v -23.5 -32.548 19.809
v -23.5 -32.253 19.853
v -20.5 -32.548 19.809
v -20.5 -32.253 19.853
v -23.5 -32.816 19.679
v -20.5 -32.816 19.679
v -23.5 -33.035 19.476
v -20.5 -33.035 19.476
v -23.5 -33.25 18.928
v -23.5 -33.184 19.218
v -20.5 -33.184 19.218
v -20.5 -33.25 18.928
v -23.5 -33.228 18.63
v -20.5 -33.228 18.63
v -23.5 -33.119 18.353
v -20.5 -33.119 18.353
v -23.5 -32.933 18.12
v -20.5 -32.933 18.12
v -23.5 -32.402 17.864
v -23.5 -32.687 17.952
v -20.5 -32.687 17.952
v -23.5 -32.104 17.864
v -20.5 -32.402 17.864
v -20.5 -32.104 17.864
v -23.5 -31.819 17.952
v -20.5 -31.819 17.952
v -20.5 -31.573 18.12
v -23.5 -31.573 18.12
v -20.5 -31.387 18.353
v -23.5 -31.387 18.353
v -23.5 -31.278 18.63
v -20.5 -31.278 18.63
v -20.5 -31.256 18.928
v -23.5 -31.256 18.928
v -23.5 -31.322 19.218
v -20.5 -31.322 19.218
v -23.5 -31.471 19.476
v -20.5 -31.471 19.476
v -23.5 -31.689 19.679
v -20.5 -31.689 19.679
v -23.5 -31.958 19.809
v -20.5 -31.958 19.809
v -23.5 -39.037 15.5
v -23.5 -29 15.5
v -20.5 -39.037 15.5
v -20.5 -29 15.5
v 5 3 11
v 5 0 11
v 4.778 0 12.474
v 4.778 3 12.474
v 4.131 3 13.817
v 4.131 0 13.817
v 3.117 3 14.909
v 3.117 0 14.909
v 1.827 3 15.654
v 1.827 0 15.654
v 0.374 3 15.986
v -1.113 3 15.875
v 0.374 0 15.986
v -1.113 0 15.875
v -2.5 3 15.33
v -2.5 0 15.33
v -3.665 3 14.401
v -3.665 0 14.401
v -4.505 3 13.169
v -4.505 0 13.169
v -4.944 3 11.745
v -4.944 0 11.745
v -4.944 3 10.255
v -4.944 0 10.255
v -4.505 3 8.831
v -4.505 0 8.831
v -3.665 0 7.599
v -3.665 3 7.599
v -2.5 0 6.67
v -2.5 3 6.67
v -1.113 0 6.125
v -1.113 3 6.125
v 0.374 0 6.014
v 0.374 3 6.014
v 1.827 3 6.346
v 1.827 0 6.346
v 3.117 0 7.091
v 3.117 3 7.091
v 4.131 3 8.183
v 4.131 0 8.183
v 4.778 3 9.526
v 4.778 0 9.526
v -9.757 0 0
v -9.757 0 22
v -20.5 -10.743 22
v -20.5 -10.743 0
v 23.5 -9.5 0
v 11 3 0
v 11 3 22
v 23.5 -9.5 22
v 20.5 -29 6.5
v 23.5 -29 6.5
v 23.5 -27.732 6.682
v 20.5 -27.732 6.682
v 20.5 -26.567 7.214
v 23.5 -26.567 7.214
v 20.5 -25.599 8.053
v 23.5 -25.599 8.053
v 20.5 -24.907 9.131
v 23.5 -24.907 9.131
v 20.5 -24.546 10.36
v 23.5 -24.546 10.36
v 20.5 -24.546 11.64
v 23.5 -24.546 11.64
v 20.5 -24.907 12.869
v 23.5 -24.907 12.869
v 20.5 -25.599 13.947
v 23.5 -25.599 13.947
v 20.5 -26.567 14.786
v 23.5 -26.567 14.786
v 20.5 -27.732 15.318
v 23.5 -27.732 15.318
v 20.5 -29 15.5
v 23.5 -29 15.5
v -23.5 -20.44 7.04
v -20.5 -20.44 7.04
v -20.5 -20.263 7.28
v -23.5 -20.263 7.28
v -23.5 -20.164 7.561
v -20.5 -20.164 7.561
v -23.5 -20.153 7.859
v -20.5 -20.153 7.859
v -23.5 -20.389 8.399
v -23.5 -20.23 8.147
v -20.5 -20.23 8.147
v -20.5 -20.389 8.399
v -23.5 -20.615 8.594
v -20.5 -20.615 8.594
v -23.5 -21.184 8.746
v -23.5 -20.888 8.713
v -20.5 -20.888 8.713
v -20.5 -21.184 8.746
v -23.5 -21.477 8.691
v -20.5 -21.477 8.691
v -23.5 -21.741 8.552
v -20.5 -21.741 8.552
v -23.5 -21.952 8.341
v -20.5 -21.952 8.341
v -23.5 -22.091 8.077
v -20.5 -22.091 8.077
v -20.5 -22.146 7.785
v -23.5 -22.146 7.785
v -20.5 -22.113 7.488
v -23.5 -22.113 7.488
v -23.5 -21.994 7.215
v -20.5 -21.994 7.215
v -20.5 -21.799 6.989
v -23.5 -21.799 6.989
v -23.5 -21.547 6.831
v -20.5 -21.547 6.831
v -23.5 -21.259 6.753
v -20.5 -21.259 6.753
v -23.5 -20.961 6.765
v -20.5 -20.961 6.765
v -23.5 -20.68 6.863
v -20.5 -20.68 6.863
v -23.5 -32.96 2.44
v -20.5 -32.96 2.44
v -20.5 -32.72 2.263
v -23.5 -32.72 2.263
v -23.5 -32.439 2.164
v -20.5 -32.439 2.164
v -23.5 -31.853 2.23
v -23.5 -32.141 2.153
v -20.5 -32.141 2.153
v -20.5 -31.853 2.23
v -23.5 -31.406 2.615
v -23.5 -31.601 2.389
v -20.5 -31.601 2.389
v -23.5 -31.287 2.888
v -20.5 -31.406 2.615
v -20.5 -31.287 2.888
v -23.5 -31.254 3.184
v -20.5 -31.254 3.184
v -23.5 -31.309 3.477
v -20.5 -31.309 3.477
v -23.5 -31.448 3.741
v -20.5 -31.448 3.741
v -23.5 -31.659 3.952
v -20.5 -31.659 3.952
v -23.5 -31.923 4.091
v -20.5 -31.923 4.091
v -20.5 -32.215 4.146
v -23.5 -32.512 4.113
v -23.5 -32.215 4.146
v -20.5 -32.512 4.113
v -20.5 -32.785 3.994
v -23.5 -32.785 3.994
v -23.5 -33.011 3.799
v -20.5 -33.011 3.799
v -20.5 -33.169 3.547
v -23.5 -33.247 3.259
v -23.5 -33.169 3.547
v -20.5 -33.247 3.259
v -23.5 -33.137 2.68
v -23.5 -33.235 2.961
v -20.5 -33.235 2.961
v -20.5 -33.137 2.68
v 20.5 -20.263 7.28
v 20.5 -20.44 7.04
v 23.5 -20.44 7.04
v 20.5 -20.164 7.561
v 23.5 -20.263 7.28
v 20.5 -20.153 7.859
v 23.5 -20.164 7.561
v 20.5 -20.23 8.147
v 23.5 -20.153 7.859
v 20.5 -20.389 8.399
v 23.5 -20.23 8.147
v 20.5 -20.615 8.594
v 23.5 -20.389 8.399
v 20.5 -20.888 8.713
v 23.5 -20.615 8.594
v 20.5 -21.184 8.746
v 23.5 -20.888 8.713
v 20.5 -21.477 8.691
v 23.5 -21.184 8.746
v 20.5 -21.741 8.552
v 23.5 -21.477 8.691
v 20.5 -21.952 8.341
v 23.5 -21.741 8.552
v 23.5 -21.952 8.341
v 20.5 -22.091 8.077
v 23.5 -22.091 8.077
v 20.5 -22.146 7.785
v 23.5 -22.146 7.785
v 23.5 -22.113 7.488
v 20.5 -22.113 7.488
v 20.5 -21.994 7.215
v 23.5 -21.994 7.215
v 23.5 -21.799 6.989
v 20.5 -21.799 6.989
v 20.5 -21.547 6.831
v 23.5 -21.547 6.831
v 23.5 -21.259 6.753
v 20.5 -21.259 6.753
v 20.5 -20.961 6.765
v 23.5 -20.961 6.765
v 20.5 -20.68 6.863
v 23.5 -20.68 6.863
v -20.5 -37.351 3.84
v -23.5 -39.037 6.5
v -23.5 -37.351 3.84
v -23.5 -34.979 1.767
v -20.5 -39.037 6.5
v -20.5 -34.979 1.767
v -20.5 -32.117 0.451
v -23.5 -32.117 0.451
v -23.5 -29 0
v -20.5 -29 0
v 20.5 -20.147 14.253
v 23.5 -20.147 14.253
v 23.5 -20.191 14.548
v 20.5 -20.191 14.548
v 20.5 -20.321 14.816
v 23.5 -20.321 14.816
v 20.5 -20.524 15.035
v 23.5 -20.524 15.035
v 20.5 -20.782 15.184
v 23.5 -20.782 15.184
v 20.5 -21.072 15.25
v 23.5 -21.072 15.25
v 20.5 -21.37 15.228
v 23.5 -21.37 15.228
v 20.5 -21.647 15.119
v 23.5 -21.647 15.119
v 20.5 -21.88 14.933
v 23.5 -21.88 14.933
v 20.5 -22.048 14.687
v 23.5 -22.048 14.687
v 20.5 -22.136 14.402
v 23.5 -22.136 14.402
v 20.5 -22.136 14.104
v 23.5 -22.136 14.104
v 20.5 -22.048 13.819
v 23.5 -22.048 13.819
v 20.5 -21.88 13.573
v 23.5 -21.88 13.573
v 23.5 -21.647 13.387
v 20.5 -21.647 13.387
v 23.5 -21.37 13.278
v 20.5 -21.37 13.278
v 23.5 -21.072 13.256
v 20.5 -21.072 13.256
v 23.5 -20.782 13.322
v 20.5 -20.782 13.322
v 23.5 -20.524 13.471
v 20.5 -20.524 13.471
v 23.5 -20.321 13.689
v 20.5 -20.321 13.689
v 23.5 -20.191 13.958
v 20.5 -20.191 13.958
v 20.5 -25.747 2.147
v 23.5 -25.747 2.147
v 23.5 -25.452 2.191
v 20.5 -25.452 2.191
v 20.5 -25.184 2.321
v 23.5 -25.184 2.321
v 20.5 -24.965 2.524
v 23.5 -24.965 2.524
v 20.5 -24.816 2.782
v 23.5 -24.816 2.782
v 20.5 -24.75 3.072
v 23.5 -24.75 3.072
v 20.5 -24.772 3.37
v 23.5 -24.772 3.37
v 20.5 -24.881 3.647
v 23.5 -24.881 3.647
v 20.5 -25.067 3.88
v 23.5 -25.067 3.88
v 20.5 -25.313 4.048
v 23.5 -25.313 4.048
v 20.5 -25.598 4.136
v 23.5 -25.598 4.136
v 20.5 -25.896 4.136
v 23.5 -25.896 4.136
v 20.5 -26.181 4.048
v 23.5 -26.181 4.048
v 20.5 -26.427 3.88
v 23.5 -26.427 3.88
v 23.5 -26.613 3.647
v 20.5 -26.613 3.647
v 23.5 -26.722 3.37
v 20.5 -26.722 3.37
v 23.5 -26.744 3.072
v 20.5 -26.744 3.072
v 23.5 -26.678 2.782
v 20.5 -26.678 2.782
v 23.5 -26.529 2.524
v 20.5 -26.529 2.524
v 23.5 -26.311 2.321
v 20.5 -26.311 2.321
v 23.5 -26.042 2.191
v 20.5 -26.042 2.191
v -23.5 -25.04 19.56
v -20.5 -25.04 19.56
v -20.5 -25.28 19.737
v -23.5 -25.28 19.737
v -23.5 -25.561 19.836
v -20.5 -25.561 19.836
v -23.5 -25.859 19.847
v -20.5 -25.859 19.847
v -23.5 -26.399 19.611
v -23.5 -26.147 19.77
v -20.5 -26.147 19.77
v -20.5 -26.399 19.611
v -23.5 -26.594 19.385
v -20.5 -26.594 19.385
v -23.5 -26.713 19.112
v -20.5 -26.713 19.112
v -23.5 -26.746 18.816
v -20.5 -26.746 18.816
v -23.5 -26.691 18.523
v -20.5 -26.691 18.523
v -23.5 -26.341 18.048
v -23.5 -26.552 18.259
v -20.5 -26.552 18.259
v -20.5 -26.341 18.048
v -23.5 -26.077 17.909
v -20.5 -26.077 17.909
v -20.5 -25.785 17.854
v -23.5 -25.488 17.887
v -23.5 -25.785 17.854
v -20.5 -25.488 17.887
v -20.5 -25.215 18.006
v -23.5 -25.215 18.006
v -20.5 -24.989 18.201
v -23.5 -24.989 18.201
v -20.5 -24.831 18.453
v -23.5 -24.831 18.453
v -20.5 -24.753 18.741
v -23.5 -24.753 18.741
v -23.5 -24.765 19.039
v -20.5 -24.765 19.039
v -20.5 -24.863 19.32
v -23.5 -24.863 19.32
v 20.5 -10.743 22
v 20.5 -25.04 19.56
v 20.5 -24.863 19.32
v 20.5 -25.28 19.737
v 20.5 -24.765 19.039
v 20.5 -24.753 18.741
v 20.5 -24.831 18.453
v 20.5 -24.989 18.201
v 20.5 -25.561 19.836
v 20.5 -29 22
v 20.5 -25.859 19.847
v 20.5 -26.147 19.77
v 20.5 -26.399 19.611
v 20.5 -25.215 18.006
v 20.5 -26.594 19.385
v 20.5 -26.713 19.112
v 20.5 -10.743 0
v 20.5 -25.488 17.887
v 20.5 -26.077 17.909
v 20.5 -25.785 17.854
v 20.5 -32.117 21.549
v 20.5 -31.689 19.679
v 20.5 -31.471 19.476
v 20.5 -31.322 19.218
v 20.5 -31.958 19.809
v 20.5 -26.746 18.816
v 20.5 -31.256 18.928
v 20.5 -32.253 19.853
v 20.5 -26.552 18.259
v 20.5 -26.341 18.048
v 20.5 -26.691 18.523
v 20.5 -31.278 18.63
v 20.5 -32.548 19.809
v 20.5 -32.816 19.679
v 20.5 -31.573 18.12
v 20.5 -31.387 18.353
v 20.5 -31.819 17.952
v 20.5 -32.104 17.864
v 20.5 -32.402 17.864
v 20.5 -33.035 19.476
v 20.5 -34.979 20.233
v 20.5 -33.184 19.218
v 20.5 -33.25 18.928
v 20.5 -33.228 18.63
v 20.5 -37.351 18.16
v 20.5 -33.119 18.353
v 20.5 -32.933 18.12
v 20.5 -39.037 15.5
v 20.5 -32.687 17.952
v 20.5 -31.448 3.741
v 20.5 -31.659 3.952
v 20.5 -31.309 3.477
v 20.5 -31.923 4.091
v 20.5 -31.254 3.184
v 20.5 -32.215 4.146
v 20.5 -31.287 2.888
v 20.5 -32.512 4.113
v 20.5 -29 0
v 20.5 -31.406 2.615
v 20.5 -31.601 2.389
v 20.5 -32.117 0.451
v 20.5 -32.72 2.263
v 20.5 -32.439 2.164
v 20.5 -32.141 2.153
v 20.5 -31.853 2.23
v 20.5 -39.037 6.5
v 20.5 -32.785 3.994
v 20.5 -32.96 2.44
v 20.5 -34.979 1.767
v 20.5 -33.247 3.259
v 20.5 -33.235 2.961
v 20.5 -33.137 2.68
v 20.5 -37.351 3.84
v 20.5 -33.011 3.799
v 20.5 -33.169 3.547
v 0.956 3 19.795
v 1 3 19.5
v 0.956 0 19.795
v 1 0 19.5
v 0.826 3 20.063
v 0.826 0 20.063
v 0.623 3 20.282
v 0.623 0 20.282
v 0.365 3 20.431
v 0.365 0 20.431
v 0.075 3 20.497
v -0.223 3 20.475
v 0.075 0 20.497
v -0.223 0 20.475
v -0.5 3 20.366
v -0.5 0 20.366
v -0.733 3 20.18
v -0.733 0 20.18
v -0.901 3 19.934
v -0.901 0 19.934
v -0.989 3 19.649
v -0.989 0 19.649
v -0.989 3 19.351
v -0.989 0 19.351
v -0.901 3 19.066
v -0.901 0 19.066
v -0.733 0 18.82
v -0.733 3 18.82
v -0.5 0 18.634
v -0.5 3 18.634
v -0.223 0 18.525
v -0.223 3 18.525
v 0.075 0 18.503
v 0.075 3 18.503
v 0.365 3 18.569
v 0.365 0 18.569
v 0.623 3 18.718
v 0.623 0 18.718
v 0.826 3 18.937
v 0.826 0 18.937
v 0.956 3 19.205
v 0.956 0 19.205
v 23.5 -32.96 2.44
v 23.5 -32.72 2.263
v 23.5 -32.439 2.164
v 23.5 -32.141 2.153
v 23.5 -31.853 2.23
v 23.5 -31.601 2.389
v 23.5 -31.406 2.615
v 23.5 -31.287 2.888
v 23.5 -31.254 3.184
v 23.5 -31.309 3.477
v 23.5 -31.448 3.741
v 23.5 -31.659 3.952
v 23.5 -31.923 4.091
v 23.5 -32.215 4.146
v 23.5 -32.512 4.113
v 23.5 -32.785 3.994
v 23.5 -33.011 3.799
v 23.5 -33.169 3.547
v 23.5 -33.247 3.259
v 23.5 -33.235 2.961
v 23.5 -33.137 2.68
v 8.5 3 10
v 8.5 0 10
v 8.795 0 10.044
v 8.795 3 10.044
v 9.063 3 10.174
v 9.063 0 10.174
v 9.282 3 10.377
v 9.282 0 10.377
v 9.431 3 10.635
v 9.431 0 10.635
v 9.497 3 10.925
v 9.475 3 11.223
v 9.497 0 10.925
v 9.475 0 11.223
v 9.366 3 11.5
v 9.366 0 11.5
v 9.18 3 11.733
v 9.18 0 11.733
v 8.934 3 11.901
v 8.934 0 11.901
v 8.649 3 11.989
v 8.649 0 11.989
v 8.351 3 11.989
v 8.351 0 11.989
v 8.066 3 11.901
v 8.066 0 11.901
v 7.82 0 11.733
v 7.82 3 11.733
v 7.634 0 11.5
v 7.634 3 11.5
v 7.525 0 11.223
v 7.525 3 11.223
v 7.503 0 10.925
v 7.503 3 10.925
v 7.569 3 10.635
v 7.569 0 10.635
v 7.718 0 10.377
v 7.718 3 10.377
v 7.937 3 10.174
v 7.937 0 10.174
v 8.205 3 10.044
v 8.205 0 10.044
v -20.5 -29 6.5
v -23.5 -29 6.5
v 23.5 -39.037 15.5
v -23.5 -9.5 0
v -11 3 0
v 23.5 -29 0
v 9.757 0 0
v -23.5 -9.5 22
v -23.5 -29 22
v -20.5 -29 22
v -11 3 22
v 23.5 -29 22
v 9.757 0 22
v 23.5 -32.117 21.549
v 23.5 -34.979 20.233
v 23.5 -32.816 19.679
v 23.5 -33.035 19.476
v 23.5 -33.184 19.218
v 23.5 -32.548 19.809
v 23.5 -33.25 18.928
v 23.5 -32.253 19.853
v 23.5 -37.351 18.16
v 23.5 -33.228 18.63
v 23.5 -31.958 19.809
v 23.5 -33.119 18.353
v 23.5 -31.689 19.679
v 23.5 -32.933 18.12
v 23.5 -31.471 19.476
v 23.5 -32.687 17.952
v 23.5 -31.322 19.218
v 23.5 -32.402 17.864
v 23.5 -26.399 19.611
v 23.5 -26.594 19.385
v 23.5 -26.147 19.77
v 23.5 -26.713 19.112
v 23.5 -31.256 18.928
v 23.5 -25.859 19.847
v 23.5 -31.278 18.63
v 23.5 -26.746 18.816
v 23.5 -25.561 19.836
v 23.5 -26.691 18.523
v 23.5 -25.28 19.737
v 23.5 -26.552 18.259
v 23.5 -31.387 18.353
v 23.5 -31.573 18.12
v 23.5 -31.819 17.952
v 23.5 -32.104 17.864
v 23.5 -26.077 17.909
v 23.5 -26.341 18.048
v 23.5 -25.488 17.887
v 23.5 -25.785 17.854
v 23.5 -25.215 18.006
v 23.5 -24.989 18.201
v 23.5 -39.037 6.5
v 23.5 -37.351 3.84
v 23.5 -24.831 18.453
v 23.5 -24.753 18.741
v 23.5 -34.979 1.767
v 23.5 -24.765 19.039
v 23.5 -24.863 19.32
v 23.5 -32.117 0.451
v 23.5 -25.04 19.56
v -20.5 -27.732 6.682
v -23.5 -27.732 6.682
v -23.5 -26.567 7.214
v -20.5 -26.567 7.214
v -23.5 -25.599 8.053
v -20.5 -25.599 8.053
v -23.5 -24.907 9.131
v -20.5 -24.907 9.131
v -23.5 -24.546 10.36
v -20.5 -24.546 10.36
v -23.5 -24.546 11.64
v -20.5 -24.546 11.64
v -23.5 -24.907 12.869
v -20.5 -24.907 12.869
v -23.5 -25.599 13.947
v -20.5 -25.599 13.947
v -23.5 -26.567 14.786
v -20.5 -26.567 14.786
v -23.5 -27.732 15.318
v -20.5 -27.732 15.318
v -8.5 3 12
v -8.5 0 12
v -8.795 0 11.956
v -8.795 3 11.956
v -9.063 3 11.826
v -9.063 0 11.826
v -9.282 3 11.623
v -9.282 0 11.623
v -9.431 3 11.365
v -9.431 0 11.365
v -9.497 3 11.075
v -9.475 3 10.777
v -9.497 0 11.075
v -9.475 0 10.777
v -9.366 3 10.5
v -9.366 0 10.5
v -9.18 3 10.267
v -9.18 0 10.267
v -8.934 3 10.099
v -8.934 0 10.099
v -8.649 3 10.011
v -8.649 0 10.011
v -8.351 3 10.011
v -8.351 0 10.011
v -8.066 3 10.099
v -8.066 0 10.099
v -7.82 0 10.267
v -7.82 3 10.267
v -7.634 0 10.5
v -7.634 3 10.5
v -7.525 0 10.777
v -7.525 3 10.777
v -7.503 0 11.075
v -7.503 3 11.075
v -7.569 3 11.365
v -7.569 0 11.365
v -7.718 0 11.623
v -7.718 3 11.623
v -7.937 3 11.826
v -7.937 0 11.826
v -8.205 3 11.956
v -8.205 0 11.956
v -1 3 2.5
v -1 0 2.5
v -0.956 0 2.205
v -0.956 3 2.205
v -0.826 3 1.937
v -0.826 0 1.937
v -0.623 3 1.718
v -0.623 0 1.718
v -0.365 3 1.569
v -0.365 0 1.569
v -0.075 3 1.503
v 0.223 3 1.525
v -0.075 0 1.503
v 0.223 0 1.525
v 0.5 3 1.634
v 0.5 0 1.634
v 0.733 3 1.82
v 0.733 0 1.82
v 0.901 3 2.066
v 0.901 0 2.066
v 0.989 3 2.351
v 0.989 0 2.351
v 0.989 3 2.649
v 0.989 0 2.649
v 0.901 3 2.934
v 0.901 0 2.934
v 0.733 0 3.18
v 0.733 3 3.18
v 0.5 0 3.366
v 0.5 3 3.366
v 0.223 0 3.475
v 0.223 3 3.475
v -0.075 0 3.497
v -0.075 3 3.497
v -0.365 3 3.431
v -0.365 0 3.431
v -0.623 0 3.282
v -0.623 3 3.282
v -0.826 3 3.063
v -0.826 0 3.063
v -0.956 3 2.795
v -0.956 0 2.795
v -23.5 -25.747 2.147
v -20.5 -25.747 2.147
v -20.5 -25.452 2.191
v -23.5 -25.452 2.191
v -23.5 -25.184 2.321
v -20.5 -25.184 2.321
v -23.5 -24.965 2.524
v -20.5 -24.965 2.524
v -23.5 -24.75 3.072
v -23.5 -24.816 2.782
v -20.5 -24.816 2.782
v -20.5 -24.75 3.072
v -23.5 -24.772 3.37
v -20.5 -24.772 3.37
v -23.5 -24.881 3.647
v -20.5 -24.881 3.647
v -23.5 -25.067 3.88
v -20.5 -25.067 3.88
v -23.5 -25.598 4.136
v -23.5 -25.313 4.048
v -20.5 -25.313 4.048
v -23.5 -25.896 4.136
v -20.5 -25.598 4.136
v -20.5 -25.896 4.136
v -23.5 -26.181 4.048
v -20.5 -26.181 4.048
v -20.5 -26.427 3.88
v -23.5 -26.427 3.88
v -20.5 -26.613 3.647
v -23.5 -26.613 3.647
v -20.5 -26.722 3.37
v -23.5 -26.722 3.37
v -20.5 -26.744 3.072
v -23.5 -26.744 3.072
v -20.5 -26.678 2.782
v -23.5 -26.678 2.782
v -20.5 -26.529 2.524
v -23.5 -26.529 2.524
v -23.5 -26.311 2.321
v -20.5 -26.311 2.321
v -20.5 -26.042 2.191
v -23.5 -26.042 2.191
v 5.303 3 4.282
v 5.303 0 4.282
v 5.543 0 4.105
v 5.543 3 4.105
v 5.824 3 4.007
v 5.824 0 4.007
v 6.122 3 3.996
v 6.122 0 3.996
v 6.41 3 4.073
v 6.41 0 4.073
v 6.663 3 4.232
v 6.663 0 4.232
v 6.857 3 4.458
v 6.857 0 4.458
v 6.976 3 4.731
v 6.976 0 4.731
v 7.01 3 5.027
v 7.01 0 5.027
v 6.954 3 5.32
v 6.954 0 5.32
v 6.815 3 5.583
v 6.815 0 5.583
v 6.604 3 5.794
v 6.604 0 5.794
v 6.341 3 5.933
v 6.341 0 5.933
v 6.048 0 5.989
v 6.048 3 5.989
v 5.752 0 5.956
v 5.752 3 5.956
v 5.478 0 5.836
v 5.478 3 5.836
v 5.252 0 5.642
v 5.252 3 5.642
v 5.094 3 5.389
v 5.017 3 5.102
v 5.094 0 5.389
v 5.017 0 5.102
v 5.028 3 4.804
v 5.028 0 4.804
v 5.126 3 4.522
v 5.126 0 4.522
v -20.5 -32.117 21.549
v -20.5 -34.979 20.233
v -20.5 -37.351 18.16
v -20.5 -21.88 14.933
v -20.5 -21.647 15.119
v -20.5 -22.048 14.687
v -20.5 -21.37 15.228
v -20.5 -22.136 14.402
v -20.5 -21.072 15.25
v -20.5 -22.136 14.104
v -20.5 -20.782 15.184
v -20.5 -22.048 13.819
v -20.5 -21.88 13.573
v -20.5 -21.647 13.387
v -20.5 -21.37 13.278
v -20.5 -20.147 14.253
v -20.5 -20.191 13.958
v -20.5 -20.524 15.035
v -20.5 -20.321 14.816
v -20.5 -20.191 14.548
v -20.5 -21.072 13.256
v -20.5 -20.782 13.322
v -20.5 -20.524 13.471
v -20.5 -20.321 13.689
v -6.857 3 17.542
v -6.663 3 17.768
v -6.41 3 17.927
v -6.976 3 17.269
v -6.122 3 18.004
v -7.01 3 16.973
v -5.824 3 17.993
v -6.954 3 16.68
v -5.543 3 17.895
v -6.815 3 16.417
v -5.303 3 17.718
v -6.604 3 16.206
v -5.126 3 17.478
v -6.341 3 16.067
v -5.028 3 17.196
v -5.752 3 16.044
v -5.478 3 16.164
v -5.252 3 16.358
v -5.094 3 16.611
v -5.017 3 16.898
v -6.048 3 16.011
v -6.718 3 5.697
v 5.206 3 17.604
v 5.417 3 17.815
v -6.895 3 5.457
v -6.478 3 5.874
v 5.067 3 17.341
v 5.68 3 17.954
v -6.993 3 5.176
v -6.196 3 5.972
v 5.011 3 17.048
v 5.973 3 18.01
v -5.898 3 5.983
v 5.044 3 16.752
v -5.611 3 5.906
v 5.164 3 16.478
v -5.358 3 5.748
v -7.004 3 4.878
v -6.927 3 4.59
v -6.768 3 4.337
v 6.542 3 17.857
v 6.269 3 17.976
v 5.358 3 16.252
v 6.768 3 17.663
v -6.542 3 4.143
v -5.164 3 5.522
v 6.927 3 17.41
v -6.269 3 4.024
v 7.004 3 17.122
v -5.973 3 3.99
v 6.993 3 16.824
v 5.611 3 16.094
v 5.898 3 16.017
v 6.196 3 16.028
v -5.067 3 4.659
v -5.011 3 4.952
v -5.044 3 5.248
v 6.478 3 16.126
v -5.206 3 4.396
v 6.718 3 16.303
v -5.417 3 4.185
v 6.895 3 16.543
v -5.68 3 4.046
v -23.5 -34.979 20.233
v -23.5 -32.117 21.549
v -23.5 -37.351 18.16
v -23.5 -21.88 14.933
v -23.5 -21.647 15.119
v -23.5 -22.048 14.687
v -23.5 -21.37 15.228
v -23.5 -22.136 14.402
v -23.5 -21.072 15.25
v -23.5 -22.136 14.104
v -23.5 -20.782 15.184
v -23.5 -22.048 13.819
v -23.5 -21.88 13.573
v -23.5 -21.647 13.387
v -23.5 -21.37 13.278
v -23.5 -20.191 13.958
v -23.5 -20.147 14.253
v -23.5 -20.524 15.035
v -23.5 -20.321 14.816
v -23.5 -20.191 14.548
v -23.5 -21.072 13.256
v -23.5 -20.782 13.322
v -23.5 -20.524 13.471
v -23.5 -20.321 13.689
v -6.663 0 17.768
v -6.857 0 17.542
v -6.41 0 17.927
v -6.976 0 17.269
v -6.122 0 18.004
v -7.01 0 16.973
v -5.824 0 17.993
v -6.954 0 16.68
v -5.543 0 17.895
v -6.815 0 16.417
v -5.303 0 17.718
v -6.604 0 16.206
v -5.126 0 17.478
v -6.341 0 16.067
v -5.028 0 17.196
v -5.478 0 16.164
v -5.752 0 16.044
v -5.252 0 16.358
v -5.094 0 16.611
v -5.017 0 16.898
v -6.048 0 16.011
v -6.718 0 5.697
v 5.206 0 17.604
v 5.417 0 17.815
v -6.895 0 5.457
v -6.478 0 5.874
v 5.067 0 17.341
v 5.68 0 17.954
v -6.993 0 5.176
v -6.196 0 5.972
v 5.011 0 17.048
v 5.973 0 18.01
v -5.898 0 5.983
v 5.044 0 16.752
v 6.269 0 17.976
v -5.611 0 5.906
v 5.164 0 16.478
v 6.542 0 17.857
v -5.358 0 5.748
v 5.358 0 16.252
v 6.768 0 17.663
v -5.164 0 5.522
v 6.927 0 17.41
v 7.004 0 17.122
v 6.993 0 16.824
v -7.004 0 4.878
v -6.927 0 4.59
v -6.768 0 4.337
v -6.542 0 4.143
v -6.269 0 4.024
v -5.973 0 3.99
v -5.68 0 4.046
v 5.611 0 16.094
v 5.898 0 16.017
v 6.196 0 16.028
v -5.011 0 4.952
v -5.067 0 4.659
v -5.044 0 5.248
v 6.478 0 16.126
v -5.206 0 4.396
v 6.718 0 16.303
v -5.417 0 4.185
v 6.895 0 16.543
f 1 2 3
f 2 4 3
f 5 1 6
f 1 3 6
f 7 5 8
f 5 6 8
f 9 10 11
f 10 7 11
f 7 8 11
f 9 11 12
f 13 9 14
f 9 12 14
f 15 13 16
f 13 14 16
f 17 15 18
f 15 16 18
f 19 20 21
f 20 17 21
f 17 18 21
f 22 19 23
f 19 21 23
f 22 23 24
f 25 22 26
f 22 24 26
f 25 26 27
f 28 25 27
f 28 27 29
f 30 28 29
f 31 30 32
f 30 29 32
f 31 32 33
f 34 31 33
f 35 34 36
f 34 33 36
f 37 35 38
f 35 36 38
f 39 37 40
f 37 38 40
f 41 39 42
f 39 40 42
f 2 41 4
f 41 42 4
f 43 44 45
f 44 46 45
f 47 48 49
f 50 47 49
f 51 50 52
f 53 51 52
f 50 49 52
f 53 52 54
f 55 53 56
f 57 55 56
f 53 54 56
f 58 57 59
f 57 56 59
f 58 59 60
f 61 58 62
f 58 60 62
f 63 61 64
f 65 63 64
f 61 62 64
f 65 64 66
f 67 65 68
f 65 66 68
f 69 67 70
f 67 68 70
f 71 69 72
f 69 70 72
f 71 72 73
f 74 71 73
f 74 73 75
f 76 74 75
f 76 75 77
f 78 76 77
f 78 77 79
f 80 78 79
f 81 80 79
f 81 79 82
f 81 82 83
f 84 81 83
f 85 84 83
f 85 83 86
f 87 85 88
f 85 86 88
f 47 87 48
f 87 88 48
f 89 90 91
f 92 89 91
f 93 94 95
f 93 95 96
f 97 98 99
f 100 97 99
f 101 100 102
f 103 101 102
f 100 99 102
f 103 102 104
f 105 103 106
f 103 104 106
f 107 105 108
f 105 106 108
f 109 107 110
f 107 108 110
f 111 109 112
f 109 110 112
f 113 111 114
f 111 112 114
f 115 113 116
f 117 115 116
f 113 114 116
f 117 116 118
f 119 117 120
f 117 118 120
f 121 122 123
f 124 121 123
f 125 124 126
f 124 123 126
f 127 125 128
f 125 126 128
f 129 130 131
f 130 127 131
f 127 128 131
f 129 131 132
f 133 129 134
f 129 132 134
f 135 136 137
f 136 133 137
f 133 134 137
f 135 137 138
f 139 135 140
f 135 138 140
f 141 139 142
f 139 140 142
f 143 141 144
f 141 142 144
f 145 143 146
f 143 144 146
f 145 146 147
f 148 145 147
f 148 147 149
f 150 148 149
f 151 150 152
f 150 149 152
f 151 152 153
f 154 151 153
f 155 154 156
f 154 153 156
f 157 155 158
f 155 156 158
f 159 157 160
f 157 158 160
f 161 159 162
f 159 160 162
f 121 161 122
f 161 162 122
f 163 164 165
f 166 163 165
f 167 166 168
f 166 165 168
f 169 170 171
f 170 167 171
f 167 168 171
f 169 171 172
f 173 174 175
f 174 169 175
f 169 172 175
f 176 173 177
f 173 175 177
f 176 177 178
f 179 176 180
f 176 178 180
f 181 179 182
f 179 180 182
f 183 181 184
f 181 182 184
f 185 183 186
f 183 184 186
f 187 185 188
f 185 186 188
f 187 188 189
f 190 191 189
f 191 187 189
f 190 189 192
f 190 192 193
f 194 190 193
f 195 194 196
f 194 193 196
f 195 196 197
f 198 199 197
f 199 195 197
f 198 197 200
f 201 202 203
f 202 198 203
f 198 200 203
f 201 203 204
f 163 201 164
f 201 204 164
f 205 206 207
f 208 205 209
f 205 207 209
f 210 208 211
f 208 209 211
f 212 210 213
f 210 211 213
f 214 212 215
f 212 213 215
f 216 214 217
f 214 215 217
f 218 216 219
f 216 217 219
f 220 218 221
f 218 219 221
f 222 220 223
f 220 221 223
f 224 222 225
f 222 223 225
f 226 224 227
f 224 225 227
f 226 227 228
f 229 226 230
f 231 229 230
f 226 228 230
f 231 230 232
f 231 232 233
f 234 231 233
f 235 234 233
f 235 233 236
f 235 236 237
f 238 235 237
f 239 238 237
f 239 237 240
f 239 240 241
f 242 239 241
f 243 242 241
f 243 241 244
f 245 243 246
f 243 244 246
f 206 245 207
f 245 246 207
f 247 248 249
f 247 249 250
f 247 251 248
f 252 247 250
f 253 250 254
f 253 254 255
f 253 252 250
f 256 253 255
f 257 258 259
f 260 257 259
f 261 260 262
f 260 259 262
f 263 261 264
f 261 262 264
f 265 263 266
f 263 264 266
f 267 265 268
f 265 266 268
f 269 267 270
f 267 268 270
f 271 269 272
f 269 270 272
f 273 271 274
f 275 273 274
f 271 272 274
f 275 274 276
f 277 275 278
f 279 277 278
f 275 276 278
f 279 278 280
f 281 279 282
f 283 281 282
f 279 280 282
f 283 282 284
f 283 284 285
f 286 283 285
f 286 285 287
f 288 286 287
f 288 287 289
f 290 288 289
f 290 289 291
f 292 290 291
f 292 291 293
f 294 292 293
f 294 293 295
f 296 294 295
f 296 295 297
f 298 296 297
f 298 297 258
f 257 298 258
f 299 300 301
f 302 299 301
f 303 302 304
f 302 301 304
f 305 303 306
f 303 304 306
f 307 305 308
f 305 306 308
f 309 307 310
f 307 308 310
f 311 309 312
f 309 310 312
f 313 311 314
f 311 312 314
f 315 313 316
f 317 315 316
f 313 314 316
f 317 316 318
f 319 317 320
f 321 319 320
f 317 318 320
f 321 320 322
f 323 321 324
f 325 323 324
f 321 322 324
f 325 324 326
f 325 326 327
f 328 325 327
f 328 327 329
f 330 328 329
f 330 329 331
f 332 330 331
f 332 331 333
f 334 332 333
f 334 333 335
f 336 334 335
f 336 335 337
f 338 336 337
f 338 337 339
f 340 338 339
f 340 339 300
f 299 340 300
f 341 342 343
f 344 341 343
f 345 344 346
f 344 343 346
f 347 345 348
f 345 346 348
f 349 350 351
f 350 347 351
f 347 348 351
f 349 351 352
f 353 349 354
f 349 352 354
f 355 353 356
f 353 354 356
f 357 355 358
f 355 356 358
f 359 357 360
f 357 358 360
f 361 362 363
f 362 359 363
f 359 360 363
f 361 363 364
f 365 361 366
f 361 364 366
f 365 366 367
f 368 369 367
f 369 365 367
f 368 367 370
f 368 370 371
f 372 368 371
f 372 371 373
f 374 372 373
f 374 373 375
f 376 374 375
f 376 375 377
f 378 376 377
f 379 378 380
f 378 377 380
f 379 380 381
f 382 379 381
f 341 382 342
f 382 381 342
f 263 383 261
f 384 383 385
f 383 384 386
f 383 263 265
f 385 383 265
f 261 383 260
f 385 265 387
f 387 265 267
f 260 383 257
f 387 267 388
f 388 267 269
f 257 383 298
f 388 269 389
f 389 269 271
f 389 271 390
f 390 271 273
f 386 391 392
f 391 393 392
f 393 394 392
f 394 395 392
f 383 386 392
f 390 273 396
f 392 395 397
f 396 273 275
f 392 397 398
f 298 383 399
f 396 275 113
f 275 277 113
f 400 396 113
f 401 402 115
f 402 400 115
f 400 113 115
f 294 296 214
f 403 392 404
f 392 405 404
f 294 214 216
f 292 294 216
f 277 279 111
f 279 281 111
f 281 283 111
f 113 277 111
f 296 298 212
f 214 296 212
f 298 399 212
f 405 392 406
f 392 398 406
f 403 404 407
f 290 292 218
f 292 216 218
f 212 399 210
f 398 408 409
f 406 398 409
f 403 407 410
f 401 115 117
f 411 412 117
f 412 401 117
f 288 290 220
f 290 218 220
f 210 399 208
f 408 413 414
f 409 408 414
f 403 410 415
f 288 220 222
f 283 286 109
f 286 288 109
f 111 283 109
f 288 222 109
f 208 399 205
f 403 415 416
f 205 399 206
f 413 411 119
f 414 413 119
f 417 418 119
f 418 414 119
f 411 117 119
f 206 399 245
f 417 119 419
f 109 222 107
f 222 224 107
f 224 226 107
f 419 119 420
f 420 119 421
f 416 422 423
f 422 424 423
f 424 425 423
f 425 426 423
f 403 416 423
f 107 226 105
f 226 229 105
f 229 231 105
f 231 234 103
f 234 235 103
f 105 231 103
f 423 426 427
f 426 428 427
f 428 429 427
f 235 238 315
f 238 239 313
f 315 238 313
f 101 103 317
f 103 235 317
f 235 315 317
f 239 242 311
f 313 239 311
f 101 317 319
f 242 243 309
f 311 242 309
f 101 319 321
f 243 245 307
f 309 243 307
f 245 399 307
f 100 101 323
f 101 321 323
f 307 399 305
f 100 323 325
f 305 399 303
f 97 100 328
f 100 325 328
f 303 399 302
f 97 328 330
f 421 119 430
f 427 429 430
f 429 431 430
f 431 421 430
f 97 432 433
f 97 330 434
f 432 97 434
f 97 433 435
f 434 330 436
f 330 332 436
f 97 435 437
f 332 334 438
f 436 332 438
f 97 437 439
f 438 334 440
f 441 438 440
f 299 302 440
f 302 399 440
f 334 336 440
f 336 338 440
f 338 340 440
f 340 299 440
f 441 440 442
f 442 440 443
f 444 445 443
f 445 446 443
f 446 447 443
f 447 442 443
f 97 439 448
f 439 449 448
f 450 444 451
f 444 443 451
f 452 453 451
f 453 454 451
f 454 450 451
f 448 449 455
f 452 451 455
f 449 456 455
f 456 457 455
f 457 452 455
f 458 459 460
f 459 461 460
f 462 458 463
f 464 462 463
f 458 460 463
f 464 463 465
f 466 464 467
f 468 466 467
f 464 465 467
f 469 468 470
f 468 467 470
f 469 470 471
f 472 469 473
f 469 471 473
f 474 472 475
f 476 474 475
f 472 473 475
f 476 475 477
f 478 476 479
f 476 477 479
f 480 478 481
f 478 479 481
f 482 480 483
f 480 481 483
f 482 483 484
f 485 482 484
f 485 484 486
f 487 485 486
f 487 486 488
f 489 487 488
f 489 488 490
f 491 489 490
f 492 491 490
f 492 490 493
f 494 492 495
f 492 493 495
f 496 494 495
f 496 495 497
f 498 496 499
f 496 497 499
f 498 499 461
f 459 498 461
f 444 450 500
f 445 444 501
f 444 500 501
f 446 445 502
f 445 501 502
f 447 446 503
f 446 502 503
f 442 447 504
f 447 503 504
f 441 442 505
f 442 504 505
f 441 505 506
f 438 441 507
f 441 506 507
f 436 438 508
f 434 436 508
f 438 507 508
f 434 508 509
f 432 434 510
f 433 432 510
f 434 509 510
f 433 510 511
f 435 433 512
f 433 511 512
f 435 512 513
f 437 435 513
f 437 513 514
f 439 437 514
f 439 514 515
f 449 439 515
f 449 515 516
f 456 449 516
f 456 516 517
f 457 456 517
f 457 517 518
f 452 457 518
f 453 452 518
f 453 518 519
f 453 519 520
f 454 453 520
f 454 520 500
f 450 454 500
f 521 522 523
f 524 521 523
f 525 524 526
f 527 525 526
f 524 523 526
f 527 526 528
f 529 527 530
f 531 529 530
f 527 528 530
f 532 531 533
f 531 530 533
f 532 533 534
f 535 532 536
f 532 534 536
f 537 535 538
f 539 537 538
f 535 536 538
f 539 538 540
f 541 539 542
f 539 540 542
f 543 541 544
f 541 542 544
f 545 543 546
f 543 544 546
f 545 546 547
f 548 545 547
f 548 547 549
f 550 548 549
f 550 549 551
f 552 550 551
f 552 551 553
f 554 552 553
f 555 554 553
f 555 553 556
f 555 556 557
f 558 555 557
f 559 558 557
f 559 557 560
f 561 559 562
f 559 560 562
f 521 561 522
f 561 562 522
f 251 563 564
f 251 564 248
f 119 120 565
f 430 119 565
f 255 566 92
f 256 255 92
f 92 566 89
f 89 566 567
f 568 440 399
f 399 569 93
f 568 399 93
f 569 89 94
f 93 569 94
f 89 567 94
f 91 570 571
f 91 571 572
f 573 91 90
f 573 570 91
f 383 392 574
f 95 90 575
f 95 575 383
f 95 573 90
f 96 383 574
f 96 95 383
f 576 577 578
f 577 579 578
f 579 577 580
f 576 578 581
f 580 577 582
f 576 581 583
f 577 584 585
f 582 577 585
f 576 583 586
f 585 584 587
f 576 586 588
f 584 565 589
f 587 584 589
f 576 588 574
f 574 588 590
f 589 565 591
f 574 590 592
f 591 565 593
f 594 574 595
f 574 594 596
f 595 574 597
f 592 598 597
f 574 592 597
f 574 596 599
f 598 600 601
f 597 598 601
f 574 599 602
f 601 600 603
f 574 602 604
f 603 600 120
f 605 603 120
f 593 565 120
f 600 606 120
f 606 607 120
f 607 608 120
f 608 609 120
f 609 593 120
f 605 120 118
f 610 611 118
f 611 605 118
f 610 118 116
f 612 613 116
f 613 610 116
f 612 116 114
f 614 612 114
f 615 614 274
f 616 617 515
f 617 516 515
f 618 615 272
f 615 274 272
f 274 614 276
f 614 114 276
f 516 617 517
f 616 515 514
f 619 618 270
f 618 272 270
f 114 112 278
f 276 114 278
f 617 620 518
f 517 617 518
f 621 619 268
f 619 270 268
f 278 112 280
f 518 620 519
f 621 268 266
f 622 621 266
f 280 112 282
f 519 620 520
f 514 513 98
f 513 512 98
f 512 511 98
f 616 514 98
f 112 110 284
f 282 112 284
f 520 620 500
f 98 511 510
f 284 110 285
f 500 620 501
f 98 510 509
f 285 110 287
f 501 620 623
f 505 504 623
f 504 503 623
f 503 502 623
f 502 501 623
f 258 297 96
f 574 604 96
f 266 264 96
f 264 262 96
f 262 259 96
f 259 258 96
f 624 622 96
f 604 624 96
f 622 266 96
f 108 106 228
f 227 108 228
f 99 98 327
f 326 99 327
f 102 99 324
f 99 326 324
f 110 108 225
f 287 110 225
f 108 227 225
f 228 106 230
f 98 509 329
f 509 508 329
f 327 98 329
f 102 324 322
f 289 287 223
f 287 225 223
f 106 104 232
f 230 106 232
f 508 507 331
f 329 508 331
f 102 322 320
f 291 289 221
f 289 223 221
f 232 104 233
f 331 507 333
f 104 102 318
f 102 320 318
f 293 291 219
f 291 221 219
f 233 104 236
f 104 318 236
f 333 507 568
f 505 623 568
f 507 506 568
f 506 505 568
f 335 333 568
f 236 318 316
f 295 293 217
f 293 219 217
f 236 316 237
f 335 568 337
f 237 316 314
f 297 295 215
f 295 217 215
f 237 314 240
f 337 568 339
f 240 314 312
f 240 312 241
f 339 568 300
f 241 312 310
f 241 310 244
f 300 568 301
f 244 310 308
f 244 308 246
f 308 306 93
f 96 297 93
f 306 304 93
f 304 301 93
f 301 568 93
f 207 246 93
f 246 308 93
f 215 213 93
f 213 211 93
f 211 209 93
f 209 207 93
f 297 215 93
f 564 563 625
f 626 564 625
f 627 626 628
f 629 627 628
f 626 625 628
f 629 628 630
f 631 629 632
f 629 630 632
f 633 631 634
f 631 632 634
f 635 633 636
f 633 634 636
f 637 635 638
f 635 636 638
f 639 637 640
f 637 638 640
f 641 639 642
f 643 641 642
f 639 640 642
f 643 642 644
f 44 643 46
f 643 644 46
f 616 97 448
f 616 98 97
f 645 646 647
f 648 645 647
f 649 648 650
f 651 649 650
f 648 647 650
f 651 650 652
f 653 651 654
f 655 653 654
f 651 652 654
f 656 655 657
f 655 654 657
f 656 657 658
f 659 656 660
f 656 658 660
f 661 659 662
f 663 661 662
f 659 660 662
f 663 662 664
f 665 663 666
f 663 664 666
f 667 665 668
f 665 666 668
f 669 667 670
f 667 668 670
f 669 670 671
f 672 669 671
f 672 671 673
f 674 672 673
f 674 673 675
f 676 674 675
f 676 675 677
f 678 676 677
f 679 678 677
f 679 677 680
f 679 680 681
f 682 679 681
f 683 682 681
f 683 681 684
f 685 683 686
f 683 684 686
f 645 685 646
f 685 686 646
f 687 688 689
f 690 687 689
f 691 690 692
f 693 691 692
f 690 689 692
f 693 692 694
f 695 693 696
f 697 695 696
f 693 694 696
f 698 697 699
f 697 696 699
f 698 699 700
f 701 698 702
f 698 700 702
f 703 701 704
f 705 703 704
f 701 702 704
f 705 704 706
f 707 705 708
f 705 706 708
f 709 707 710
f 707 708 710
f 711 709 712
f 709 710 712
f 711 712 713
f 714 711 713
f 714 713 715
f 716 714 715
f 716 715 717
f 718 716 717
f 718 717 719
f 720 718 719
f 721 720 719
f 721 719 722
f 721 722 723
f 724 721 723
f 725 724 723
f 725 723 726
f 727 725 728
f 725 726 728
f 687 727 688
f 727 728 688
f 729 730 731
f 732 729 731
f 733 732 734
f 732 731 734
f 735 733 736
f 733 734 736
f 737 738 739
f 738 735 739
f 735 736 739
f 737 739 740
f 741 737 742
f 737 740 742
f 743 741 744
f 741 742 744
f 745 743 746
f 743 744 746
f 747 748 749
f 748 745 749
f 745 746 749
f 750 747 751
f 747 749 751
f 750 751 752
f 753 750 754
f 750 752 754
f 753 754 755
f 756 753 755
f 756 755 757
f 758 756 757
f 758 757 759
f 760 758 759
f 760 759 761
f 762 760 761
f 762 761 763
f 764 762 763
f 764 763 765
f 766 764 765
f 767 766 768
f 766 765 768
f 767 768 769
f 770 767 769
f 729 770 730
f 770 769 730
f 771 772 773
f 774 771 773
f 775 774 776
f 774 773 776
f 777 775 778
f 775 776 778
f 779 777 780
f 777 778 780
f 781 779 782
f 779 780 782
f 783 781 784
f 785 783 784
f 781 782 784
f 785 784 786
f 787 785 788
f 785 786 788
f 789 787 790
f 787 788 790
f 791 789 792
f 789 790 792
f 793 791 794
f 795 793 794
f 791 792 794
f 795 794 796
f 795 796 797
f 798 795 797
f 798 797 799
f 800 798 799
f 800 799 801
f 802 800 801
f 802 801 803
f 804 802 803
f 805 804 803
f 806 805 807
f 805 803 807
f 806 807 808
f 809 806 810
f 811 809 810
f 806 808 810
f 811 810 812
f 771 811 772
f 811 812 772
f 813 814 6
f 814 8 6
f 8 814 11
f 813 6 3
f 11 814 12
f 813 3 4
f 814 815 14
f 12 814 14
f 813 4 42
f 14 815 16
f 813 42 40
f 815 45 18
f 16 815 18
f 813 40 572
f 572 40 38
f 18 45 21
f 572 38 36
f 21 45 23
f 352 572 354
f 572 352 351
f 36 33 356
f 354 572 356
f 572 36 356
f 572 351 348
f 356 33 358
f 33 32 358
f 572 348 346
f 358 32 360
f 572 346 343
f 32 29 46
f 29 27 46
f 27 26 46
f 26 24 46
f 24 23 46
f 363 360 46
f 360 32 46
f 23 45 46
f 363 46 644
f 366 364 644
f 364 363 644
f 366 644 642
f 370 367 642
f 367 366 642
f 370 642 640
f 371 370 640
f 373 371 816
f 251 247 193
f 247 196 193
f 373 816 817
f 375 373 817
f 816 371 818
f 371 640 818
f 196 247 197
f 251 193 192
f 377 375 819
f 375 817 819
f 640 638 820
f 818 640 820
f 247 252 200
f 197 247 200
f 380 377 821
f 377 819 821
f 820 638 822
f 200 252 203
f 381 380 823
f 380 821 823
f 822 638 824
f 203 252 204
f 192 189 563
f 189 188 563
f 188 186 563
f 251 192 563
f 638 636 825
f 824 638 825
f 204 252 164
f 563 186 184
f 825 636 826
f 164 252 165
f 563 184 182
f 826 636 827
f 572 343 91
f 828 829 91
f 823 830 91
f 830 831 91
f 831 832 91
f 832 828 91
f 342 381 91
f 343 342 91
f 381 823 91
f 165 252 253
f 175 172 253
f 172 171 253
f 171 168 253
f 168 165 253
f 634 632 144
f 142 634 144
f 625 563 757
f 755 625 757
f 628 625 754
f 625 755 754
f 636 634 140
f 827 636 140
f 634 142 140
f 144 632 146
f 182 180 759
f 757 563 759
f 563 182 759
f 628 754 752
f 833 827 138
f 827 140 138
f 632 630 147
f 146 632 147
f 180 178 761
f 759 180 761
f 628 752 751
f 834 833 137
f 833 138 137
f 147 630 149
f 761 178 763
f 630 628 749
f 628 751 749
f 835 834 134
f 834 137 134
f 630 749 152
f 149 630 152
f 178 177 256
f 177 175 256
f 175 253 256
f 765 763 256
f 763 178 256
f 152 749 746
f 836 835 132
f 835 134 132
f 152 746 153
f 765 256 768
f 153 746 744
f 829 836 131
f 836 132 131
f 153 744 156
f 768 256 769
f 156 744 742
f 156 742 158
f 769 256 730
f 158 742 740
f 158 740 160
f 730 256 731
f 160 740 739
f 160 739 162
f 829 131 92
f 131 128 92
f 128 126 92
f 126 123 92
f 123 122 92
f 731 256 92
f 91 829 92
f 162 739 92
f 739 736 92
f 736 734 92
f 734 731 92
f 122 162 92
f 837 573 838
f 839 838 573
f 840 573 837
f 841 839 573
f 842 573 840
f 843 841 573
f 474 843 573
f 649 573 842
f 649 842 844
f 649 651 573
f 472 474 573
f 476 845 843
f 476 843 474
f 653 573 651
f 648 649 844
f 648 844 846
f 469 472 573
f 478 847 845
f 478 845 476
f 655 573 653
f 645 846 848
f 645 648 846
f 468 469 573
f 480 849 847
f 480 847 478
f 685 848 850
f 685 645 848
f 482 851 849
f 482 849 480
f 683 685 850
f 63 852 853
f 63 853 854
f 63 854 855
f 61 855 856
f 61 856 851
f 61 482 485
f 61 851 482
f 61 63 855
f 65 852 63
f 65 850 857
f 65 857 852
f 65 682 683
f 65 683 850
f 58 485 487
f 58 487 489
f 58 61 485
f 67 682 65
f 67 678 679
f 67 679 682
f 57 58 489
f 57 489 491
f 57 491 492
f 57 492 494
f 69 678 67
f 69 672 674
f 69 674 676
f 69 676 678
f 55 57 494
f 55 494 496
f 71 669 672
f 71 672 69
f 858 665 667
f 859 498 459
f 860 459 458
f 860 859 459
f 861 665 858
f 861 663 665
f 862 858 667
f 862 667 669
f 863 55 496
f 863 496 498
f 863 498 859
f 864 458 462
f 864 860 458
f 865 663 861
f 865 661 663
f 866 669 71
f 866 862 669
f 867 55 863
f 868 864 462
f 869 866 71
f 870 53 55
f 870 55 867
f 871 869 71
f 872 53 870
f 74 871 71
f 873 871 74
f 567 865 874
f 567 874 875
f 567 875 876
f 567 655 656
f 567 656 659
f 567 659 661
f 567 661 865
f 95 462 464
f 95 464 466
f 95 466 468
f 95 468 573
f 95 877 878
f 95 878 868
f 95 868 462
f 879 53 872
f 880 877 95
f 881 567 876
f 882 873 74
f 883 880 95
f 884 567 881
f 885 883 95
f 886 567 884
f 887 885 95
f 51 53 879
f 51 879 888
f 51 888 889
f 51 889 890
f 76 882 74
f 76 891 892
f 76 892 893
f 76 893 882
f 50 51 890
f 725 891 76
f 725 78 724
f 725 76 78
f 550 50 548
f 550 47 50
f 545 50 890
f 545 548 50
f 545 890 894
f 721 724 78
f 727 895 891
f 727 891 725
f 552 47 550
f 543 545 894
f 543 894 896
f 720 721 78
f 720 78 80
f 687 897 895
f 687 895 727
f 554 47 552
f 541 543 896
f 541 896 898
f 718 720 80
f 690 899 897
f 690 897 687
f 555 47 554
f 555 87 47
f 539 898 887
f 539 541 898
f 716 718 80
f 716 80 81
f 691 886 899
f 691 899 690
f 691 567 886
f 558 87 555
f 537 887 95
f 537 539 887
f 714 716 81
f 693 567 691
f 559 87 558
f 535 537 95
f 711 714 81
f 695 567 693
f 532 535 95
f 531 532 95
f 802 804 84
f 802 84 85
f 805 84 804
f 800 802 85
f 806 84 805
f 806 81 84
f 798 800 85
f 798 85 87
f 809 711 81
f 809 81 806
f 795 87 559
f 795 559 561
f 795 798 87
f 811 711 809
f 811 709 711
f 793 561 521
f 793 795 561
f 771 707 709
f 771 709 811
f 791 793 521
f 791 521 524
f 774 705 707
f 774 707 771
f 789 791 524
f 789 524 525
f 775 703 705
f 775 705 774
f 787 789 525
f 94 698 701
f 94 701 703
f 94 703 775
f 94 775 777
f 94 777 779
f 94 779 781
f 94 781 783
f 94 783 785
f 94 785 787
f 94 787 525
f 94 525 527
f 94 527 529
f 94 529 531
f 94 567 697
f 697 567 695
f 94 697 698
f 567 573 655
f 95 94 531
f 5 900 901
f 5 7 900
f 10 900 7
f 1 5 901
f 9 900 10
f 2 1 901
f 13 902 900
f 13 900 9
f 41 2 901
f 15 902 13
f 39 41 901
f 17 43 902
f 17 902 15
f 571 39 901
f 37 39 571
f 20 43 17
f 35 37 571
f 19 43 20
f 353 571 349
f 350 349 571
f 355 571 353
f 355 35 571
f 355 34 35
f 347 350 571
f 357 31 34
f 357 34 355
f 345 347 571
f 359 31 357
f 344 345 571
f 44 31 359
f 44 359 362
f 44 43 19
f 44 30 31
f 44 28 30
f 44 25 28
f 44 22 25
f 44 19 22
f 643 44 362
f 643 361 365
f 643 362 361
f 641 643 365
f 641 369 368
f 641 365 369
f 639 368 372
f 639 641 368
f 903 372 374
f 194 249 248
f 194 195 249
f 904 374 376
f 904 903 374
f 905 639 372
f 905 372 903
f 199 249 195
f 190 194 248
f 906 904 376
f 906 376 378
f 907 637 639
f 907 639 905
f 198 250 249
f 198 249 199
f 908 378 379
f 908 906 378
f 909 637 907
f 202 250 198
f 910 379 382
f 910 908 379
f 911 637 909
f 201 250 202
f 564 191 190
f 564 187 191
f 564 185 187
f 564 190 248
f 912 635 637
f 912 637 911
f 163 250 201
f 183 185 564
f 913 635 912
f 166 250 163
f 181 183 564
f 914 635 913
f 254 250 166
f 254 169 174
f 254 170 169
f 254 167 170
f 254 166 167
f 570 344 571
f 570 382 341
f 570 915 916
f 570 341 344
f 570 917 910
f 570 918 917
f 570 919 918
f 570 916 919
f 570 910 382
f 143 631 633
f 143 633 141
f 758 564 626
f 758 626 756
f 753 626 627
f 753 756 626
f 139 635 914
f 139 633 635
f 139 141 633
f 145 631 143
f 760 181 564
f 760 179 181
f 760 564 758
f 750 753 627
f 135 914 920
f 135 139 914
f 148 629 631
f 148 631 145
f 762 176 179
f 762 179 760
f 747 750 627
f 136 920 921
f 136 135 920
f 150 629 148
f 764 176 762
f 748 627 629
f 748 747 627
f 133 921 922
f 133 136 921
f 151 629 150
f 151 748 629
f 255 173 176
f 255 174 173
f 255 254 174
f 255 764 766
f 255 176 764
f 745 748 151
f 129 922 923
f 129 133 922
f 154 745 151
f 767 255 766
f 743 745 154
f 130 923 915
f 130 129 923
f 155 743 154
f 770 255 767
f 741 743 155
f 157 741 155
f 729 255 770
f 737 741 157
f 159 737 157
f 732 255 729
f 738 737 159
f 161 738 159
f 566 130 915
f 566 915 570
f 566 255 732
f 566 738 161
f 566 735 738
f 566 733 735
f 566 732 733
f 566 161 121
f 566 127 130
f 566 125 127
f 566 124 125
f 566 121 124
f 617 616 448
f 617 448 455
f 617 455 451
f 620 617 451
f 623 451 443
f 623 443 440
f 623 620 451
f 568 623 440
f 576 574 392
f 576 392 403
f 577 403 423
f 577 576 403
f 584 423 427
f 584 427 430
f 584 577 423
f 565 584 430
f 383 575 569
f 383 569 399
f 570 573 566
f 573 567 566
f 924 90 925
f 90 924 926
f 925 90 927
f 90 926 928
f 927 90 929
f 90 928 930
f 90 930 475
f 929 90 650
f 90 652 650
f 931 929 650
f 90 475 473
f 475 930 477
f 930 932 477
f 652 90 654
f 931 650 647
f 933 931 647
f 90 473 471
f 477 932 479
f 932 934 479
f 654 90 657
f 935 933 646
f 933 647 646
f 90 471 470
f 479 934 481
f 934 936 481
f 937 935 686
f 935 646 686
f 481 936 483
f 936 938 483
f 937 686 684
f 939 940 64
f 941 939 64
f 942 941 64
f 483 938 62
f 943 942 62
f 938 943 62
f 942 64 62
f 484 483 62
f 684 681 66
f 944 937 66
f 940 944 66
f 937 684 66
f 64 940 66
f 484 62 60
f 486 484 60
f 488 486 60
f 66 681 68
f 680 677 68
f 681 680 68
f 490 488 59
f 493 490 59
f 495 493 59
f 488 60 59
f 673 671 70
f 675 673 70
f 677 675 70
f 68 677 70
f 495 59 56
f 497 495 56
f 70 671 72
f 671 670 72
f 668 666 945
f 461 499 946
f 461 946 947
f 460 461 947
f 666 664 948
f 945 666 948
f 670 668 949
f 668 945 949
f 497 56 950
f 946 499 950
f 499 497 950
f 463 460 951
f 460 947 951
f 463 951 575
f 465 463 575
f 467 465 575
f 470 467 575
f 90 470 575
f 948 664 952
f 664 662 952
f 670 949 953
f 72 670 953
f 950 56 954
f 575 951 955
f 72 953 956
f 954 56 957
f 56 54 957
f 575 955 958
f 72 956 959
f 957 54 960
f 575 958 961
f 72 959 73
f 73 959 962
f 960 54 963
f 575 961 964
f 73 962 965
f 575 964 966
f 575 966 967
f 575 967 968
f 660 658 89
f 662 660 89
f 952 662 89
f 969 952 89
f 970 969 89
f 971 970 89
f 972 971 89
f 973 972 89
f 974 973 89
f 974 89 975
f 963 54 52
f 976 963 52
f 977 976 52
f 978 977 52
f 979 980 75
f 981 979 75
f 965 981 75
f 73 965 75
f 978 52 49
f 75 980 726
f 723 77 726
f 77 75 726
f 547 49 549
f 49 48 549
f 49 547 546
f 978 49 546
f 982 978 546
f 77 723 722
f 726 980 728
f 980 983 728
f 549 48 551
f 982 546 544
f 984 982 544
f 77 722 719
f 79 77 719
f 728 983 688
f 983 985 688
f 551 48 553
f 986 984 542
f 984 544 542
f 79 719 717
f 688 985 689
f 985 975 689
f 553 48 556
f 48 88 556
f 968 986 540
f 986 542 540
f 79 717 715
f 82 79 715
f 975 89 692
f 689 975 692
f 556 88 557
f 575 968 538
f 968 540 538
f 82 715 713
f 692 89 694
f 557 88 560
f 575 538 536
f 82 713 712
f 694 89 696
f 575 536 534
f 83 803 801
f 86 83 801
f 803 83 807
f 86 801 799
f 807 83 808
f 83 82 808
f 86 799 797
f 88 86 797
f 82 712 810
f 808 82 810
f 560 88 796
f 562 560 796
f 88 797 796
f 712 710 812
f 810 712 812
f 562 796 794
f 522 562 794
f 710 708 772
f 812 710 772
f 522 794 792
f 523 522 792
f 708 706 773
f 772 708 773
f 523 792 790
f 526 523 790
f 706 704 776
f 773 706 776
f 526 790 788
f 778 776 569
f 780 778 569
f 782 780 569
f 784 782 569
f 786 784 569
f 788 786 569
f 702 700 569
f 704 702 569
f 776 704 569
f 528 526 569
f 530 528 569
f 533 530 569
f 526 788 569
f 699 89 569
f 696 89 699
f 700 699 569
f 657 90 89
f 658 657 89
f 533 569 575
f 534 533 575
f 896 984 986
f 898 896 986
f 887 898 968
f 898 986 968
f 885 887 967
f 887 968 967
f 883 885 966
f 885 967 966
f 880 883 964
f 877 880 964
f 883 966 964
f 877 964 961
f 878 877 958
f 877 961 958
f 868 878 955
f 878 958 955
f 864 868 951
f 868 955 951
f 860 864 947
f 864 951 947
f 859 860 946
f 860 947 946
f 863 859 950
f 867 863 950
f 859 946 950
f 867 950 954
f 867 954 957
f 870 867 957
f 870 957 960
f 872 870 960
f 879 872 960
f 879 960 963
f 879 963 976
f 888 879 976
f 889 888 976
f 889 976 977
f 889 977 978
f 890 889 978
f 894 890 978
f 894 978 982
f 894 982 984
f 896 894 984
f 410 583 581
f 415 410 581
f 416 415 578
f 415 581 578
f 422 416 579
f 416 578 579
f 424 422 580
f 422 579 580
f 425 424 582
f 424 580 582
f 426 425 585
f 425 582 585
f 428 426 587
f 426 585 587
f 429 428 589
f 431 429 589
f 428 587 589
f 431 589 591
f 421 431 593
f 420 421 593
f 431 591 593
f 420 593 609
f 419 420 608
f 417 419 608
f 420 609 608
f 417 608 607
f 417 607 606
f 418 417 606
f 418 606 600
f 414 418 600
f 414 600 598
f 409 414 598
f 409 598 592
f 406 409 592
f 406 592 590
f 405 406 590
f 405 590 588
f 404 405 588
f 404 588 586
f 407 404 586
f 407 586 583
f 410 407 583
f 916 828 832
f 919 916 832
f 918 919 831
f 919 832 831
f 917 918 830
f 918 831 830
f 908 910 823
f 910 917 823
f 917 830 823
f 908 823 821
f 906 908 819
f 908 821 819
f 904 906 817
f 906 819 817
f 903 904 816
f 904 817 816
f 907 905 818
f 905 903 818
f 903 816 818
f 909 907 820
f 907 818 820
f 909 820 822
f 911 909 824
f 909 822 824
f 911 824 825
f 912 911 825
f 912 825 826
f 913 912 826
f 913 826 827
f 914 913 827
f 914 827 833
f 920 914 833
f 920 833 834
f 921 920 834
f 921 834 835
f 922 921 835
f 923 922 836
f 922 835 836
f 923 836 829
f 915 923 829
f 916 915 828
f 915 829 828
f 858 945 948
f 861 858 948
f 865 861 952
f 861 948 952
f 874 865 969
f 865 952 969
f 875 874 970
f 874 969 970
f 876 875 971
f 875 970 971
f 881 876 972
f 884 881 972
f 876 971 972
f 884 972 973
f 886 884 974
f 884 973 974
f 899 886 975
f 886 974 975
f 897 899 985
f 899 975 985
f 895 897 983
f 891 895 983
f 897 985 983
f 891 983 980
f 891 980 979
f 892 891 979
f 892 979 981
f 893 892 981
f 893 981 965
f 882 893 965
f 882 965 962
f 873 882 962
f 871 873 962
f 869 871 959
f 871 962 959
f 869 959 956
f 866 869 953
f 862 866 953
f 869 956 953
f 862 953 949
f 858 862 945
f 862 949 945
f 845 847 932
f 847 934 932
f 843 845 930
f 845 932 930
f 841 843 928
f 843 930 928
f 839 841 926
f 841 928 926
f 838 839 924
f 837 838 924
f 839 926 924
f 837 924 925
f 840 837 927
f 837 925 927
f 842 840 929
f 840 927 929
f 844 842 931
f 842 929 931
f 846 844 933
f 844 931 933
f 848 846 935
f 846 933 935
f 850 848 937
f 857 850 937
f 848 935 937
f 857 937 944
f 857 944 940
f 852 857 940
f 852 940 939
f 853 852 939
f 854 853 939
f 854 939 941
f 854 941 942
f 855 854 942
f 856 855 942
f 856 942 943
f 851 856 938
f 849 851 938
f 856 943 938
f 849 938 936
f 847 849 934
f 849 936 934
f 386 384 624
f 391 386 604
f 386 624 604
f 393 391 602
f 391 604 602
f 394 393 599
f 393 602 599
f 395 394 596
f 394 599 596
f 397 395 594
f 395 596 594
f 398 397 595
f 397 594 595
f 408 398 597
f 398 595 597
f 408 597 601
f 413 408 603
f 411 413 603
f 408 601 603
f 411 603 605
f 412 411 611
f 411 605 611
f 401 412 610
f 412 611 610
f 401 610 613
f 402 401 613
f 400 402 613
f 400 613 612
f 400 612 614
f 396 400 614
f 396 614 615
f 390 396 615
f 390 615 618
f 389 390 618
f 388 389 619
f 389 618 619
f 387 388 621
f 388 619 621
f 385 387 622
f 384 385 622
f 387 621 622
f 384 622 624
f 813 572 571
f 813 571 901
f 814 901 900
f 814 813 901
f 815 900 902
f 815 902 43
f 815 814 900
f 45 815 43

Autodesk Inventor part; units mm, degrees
ref_plane "YZ Plane" through (0, 0, 0) normal (1, 0, 0) x (0, 1, 0)
ref_plane "XZ Plane" through (0, 0, 0) normal (0, 1, 0) x (-1, 0, 0)
ref_plane "XY Plane" through (0, 0, 0) normal (0, 0, 1) x (1, 0, 0)
sketch "Sketch1" plane through (0, 0, 0) normal (0, 0, 1) x (1, 0, 0)
  line L0 (-20.5, -40) -> (-20.5, -10.7426)
  line L1 (-9.7574, 0) -> (9.7574, 0)
  line L2 (20.5, -10.7426) -> (20.5, -40)
  line L3 (20.5, -40) -> (23.5, -40)
  line L4 (23.5, -40) -> (23.5, -9.5)
  line L5 (-20.5, -40) -> (-23.5, -40)
  line L6 (-23.5, -40) -> (-23.5, -9.5)
  line L7 (-11, 3) -> (11, 3)
  line L8 (-11, 3) -> (-23.5, -9.5)
  line L9 (-9.7574, 0) -> (-20.5, -10.7426)
  line L10 (11, 3) -> (23.5, -9.5)
  line L11 (9.7574, 0) -> (20.5, -10.7426)
  point P0 (0, 0)
extrude "Extrusion1" add sketch "Sketch1" along normal blind 22
sketch "Sketch2" plane through (23.5, -40, 0) normal (1, 0, 0) x (0, 0, -1)
  line L0 (-22, 30.5) -> (-22, 0) projected
  line L1 (0, 0) -> (-22, 0) projected
  line L2 (0, 0) -> (0, 30.5) projected
  line L3 (0, 30.5) -> (-22, 30.5) projected
  arc A0 (-22, 11) -> (0, 11) centre (-11, 11) ccw
  line L4 (-22, 29.2574) -> (-22, 0) projected
  line L5 (-22, 11) -> (-22, -1)
  line L6 (-22, -1) -> (0, -1)
  line L7 (0, -1) -> (0, 11)
  line L8 (0, 0) -> (0, 29.2574) projected
  circle A1 centre (-11, 11) radius 4.5
  line L9 (-15.5, 11) -> (-15.5, -1)
  line L10 (-6.5, 11) -> (-6.5, -1)
  point P0 (0, 40)
  dimension "d2" = 22
  dimension "d3" = 11
  dimension "d4" = 9
extrude "Extrusion2" cut sketch "Sketch2" against normal through all contours A0 L9 L1 L0 | L1 L9 L6 L5 | L9 A1 L10 A0 | A0 L1 L9 | L2 L1 L10 A0 | L1 L10 L6 L9 | A0 L10 L1 | A1 | L7 L6 L10 L1
sketch "Sketch3" plane through (-9.7574, 0, 0) normal (0, -1, 0) x (1, 0, 0)
  circle A0 centre (9.7574, 11) radius 5
  point P0 (9.7574, 0)
  dimension "d7" = 10
extrude "Extrusion3" cut sketch "Sketch3" against normal through all
sketch "Sketch4" plane through (23.5, -9.5, 22) normal (1, 0, 0) x (0, 0, -1)
  arc A0 (15.5, -29.5374) -> (22, -19.5) centre (11, -19.5) ccw projected
  line L0 (11, -19.5) -> (18.853, -16.2472)
  line L1 (11, -19.5) -> (19.5, -19.5) construction
  circle A1 centre (18.853, -16.2472) radius 1
  point P0 (22, 9.5)
  dimension "d10" = 8.5
  dimension "d11" = 22.5
  dimension "d12" = 2
extrude "Extrusion4" cut sketch "Sketch4" against normal through all
pattern_circular "Circular Pattern1" count 8 over 360 about axis through (23.5, -29, 11) along (-1, 0, 0) of "Extrusion4"
sketch "Sketch5" plane through (-9.7574, 0, 0) normal (0, -1, 0) x (1, 0, 0)
  circle A0 centre (9.7574, 11) radius 5 projected
  circle A1 centre (9.7574, 19.5) radius 1
  point P0 (9.7574, 0)
  dimension "d18" = 2
  dimension "d19" = 8.5
extrude "Extrusion5" cut sketch "Sketch5" against normal through all contours A1
pattern_circular "Circular Pattern2" count 8 over 360 about axis through (0, 0, 11) along (0, 1, 0) of "Extrusion5"
properties part number "Waistline" material "Aluminum-6061"
